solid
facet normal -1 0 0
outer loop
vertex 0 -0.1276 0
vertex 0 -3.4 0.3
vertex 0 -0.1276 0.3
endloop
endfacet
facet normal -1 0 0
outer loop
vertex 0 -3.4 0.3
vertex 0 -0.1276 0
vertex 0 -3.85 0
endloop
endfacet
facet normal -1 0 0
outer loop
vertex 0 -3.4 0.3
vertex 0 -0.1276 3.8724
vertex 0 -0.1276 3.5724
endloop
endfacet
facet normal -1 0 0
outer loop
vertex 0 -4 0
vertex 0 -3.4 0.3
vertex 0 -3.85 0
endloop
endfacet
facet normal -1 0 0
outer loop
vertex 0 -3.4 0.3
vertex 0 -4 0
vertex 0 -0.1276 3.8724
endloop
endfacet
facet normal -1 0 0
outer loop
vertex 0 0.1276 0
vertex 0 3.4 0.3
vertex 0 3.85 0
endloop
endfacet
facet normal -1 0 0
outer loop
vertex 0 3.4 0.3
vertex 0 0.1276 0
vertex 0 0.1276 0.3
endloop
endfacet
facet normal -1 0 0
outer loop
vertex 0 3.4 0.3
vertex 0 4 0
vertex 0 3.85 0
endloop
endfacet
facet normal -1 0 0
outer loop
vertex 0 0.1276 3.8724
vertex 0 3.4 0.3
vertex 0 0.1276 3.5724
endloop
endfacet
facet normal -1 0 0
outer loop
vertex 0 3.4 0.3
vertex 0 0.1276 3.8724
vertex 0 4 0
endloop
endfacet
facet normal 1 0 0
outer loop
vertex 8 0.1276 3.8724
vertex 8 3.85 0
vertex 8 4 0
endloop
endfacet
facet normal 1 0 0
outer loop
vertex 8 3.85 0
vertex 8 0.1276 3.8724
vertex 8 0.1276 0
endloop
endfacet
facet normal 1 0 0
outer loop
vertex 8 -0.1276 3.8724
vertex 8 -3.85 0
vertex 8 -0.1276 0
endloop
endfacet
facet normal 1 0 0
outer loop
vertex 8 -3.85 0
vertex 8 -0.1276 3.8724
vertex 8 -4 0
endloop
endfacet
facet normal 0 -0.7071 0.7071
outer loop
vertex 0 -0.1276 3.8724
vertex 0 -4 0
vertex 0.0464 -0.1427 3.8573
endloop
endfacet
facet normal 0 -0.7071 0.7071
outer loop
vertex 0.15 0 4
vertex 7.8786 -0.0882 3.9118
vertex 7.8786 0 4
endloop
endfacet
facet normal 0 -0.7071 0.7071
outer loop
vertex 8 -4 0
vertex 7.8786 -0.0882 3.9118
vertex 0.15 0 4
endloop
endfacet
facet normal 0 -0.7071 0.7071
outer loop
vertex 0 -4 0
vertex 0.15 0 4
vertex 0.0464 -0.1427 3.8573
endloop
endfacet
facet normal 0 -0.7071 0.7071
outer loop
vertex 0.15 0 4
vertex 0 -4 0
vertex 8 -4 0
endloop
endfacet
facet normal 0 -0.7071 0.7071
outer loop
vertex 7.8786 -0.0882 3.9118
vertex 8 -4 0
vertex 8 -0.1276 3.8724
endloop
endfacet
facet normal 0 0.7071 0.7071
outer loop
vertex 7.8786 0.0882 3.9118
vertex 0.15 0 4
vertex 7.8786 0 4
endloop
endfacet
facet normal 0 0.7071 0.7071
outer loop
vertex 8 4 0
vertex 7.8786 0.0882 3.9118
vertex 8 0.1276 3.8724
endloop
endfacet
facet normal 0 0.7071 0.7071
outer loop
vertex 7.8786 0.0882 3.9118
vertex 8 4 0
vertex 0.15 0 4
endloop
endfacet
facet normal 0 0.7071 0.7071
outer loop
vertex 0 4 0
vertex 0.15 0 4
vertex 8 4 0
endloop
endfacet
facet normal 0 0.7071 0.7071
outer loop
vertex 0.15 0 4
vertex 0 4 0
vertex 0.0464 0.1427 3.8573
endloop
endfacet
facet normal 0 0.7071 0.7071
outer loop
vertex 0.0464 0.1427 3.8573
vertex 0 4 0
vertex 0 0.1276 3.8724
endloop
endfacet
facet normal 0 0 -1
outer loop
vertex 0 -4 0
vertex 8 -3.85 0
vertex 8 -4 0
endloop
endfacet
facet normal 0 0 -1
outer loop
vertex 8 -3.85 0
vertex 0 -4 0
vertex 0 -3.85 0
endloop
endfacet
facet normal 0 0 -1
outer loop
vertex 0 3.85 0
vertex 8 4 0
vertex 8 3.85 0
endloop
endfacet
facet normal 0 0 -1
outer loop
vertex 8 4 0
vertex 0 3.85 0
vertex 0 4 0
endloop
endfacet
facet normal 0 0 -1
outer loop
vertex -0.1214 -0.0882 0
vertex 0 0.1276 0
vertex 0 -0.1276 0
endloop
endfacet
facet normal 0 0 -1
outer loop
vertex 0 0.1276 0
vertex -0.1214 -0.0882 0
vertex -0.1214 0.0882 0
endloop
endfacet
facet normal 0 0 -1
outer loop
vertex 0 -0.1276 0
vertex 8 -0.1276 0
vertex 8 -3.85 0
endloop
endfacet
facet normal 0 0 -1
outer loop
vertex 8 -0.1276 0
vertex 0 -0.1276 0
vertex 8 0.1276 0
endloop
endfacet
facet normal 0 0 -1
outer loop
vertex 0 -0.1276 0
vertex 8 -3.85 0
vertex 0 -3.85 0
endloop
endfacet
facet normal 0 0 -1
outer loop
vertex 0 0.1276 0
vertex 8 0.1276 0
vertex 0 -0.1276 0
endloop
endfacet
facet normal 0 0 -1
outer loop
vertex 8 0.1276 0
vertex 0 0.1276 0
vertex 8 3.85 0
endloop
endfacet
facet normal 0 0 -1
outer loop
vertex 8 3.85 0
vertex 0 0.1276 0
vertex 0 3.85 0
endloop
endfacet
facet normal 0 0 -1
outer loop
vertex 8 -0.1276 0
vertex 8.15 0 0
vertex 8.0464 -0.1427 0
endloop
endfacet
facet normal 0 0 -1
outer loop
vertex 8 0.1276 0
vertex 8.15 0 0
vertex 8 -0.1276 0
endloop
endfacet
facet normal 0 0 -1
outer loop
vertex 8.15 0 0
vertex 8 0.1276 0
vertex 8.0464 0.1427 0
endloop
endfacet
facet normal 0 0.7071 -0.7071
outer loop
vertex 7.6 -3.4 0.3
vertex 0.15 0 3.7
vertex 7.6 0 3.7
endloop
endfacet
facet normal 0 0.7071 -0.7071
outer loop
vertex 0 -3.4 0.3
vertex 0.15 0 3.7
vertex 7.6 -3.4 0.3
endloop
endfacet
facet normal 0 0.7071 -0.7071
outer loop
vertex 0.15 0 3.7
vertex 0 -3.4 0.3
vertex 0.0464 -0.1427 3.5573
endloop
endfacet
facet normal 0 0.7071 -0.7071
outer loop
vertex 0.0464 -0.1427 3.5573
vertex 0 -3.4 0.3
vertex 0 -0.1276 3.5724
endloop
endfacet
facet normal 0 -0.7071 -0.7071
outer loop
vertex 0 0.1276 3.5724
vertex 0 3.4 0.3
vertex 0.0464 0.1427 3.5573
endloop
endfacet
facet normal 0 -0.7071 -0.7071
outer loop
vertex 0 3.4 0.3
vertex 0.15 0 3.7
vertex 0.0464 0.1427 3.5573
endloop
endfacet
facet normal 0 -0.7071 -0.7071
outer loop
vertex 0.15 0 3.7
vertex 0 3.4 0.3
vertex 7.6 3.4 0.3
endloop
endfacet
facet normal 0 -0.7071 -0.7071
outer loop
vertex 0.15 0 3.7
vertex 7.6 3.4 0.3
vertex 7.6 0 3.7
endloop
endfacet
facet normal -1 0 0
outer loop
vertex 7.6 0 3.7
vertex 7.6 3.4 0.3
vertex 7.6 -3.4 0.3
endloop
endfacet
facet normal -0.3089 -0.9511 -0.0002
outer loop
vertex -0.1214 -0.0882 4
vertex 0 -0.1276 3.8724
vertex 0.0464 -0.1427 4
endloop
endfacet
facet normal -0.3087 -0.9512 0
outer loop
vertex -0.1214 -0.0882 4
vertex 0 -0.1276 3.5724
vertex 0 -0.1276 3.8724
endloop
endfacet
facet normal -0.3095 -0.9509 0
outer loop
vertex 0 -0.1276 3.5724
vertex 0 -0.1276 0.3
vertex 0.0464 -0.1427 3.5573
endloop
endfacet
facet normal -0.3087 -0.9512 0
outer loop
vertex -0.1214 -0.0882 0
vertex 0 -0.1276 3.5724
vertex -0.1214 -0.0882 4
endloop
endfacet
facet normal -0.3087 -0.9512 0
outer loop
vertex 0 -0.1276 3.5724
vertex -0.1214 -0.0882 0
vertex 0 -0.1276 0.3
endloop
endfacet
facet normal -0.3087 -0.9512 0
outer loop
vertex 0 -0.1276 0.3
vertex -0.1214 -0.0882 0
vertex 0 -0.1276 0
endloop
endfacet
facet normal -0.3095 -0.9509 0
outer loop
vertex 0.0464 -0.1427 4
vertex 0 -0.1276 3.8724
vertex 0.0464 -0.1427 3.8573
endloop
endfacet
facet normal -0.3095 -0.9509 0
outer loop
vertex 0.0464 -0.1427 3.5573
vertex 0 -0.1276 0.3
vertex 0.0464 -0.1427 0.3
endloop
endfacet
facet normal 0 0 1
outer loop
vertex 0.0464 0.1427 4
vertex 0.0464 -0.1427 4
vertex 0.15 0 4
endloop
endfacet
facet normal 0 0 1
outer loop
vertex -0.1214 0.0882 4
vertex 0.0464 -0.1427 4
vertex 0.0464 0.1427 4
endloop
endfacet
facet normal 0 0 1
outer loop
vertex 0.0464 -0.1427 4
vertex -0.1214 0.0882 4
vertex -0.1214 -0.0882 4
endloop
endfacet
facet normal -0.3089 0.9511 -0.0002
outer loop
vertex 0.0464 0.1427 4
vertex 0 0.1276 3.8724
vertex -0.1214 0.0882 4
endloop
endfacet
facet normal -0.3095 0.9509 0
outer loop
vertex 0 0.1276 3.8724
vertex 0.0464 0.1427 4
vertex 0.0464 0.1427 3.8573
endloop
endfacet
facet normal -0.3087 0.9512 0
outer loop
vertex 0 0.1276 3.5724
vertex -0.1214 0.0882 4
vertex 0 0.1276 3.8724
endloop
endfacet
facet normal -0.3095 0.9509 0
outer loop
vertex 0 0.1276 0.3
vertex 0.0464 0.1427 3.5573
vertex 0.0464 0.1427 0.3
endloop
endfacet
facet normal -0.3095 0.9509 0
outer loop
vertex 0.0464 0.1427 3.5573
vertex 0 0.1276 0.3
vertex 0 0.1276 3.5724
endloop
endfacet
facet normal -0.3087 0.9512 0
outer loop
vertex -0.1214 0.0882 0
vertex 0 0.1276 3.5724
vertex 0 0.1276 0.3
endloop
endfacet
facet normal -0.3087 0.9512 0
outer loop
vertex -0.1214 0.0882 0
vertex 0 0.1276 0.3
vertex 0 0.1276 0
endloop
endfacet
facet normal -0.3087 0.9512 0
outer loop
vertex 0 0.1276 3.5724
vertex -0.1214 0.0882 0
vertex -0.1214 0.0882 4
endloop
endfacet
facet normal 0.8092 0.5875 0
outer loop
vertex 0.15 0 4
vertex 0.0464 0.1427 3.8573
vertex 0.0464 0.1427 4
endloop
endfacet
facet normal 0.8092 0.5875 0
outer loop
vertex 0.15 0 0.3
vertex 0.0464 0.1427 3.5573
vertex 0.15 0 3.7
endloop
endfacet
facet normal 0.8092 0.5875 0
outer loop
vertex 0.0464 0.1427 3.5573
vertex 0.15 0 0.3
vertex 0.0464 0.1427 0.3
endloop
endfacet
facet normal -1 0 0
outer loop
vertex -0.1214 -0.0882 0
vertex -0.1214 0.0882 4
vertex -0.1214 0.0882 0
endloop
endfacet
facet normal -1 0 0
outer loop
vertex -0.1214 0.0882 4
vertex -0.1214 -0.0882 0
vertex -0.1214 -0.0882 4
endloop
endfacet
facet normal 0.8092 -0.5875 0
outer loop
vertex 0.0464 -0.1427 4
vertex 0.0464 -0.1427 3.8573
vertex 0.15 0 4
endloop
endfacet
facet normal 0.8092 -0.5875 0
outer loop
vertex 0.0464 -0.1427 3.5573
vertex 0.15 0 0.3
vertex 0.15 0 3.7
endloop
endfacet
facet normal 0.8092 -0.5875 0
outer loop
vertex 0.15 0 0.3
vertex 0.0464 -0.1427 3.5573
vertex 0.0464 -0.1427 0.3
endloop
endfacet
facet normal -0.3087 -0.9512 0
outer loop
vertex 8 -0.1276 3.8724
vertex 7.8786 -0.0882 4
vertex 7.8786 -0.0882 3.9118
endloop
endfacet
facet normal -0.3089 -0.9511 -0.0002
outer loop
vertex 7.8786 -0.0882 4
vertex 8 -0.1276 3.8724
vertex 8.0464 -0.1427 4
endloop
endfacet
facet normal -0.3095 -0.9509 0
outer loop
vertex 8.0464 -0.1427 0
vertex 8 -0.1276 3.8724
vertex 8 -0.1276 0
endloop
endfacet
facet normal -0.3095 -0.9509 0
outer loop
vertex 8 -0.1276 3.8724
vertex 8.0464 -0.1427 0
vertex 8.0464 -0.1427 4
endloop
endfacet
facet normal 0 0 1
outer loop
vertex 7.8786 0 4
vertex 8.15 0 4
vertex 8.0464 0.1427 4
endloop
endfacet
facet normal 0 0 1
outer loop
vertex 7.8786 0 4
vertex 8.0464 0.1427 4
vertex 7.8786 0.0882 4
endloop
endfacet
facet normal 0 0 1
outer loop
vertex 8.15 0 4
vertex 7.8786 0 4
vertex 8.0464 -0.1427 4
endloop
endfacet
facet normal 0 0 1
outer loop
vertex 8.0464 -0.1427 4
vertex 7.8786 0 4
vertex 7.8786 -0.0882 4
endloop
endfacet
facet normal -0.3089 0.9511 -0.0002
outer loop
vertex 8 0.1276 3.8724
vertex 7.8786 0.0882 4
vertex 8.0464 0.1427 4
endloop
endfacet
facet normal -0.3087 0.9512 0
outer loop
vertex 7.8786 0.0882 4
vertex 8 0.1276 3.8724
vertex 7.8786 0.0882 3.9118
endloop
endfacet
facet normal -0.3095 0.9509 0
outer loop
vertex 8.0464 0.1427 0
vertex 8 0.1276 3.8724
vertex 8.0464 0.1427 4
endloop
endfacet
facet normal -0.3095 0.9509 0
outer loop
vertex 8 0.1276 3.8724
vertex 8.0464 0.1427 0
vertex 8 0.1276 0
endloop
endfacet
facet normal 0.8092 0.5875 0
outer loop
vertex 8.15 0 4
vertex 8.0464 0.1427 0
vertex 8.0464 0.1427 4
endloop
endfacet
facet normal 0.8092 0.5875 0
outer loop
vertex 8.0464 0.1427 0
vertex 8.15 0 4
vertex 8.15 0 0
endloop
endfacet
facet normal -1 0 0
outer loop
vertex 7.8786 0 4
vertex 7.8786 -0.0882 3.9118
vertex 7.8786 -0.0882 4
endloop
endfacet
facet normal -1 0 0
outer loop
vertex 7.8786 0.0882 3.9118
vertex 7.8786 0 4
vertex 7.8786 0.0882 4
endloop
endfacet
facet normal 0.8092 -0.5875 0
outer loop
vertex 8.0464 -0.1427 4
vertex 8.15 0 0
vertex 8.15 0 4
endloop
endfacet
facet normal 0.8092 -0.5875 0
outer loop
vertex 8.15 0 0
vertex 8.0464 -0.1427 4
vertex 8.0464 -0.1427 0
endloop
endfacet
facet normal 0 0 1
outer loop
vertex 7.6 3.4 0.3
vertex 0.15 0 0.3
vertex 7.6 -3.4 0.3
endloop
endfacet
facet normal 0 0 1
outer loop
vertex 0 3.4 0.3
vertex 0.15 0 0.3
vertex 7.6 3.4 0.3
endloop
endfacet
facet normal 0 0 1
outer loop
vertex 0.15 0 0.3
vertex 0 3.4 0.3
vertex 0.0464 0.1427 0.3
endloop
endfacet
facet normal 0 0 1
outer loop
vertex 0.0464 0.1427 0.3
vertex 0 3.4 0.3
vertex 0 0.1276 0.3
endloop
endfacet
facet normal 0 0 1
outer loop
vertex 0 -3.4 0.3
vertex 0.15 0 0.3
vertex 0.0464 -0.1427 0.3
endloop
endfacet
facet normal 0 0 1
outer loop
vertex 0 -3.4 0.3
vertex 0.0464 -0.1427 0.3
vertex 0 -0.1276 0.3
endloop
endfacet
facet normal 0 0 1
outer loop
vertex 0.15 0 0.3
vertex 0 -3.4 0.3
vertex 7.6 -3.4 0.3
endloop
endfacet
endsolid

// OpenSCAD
// tents.scad
// OpenSCAD Template
// 
// Copyright (C) 2013 Christopher Roberts
//
// This program is free software: you can redistribute it and/or modify
// it under the terms of the GNU General Public License as published by
// the Free Software Foundation, either version 3 of the License, or
// (at your option) any later version.
// 
// This program is distributed in the hope that it will be useful,
// but WITHOUT ANY WARRANTY; without even the implied warranty of
// MERCHANTABILITY or FITNESS FOR A PARTICULAR PURPOSE.  See the
// GNU General Public License for more details.
// 
// You should have received a copy of the GNU General Public License
// along with this program.  If not, see <http://www.gnu.org/licenses/>.


// Global Parameters
height = 4; // Height of tent pole
length = 8; // Length of tent
layer  = 0.3; // Layer height

module tent_shape( l, h) {

    difference() {

        // Things that exist
        union() {
            translate( v = [ 0, 0, -height ] ) {
                rotate( a = [ 45, 0, 0 ] ) {
                    cube( size = [l, sqrt(0.5 * pow(h*2,2)), sqrt(0.5 * pow(h*2,2)) ] );
                }
            }
        }

        // Things to be cut out
        union() {
            translate( v = [ -0.1, -h, -h] ) {
                cube( size = [ length + 0.2, 2* height, height ] );
            }
        }
    }

}

module tent() {

    difference() {

        // Things that exist
        union() {
            tent_shape(length, height);
        }

        // Things that don't exist
        union() {
            translate( v = [ -0.1, 0, -layer ] ) {
                tent_shape(length -layer, height);
            }
        }
    
    }

}

module tent_complete() {

    difference() {

        // Things that exist
        union() {
            tent();
            cylinder( r = layer/2, h = height );
            translate( v = [ length, 0, 0 ] ) {
                cylinder( r = layer/2, h = height );
            }
            translate( v = [0, -height +layer, 0] ) {
                cube( size = [length, 2 * (height - layer), layer ] );
            }
            translate( v = [0, -height + layer/2, 0] ) {
                cube( size = [length, 2 * height - layer, layer/2 ] );
            }

        }

        // Things that don't exist
        union() {

        }
    
    }

}

tent_complete();
